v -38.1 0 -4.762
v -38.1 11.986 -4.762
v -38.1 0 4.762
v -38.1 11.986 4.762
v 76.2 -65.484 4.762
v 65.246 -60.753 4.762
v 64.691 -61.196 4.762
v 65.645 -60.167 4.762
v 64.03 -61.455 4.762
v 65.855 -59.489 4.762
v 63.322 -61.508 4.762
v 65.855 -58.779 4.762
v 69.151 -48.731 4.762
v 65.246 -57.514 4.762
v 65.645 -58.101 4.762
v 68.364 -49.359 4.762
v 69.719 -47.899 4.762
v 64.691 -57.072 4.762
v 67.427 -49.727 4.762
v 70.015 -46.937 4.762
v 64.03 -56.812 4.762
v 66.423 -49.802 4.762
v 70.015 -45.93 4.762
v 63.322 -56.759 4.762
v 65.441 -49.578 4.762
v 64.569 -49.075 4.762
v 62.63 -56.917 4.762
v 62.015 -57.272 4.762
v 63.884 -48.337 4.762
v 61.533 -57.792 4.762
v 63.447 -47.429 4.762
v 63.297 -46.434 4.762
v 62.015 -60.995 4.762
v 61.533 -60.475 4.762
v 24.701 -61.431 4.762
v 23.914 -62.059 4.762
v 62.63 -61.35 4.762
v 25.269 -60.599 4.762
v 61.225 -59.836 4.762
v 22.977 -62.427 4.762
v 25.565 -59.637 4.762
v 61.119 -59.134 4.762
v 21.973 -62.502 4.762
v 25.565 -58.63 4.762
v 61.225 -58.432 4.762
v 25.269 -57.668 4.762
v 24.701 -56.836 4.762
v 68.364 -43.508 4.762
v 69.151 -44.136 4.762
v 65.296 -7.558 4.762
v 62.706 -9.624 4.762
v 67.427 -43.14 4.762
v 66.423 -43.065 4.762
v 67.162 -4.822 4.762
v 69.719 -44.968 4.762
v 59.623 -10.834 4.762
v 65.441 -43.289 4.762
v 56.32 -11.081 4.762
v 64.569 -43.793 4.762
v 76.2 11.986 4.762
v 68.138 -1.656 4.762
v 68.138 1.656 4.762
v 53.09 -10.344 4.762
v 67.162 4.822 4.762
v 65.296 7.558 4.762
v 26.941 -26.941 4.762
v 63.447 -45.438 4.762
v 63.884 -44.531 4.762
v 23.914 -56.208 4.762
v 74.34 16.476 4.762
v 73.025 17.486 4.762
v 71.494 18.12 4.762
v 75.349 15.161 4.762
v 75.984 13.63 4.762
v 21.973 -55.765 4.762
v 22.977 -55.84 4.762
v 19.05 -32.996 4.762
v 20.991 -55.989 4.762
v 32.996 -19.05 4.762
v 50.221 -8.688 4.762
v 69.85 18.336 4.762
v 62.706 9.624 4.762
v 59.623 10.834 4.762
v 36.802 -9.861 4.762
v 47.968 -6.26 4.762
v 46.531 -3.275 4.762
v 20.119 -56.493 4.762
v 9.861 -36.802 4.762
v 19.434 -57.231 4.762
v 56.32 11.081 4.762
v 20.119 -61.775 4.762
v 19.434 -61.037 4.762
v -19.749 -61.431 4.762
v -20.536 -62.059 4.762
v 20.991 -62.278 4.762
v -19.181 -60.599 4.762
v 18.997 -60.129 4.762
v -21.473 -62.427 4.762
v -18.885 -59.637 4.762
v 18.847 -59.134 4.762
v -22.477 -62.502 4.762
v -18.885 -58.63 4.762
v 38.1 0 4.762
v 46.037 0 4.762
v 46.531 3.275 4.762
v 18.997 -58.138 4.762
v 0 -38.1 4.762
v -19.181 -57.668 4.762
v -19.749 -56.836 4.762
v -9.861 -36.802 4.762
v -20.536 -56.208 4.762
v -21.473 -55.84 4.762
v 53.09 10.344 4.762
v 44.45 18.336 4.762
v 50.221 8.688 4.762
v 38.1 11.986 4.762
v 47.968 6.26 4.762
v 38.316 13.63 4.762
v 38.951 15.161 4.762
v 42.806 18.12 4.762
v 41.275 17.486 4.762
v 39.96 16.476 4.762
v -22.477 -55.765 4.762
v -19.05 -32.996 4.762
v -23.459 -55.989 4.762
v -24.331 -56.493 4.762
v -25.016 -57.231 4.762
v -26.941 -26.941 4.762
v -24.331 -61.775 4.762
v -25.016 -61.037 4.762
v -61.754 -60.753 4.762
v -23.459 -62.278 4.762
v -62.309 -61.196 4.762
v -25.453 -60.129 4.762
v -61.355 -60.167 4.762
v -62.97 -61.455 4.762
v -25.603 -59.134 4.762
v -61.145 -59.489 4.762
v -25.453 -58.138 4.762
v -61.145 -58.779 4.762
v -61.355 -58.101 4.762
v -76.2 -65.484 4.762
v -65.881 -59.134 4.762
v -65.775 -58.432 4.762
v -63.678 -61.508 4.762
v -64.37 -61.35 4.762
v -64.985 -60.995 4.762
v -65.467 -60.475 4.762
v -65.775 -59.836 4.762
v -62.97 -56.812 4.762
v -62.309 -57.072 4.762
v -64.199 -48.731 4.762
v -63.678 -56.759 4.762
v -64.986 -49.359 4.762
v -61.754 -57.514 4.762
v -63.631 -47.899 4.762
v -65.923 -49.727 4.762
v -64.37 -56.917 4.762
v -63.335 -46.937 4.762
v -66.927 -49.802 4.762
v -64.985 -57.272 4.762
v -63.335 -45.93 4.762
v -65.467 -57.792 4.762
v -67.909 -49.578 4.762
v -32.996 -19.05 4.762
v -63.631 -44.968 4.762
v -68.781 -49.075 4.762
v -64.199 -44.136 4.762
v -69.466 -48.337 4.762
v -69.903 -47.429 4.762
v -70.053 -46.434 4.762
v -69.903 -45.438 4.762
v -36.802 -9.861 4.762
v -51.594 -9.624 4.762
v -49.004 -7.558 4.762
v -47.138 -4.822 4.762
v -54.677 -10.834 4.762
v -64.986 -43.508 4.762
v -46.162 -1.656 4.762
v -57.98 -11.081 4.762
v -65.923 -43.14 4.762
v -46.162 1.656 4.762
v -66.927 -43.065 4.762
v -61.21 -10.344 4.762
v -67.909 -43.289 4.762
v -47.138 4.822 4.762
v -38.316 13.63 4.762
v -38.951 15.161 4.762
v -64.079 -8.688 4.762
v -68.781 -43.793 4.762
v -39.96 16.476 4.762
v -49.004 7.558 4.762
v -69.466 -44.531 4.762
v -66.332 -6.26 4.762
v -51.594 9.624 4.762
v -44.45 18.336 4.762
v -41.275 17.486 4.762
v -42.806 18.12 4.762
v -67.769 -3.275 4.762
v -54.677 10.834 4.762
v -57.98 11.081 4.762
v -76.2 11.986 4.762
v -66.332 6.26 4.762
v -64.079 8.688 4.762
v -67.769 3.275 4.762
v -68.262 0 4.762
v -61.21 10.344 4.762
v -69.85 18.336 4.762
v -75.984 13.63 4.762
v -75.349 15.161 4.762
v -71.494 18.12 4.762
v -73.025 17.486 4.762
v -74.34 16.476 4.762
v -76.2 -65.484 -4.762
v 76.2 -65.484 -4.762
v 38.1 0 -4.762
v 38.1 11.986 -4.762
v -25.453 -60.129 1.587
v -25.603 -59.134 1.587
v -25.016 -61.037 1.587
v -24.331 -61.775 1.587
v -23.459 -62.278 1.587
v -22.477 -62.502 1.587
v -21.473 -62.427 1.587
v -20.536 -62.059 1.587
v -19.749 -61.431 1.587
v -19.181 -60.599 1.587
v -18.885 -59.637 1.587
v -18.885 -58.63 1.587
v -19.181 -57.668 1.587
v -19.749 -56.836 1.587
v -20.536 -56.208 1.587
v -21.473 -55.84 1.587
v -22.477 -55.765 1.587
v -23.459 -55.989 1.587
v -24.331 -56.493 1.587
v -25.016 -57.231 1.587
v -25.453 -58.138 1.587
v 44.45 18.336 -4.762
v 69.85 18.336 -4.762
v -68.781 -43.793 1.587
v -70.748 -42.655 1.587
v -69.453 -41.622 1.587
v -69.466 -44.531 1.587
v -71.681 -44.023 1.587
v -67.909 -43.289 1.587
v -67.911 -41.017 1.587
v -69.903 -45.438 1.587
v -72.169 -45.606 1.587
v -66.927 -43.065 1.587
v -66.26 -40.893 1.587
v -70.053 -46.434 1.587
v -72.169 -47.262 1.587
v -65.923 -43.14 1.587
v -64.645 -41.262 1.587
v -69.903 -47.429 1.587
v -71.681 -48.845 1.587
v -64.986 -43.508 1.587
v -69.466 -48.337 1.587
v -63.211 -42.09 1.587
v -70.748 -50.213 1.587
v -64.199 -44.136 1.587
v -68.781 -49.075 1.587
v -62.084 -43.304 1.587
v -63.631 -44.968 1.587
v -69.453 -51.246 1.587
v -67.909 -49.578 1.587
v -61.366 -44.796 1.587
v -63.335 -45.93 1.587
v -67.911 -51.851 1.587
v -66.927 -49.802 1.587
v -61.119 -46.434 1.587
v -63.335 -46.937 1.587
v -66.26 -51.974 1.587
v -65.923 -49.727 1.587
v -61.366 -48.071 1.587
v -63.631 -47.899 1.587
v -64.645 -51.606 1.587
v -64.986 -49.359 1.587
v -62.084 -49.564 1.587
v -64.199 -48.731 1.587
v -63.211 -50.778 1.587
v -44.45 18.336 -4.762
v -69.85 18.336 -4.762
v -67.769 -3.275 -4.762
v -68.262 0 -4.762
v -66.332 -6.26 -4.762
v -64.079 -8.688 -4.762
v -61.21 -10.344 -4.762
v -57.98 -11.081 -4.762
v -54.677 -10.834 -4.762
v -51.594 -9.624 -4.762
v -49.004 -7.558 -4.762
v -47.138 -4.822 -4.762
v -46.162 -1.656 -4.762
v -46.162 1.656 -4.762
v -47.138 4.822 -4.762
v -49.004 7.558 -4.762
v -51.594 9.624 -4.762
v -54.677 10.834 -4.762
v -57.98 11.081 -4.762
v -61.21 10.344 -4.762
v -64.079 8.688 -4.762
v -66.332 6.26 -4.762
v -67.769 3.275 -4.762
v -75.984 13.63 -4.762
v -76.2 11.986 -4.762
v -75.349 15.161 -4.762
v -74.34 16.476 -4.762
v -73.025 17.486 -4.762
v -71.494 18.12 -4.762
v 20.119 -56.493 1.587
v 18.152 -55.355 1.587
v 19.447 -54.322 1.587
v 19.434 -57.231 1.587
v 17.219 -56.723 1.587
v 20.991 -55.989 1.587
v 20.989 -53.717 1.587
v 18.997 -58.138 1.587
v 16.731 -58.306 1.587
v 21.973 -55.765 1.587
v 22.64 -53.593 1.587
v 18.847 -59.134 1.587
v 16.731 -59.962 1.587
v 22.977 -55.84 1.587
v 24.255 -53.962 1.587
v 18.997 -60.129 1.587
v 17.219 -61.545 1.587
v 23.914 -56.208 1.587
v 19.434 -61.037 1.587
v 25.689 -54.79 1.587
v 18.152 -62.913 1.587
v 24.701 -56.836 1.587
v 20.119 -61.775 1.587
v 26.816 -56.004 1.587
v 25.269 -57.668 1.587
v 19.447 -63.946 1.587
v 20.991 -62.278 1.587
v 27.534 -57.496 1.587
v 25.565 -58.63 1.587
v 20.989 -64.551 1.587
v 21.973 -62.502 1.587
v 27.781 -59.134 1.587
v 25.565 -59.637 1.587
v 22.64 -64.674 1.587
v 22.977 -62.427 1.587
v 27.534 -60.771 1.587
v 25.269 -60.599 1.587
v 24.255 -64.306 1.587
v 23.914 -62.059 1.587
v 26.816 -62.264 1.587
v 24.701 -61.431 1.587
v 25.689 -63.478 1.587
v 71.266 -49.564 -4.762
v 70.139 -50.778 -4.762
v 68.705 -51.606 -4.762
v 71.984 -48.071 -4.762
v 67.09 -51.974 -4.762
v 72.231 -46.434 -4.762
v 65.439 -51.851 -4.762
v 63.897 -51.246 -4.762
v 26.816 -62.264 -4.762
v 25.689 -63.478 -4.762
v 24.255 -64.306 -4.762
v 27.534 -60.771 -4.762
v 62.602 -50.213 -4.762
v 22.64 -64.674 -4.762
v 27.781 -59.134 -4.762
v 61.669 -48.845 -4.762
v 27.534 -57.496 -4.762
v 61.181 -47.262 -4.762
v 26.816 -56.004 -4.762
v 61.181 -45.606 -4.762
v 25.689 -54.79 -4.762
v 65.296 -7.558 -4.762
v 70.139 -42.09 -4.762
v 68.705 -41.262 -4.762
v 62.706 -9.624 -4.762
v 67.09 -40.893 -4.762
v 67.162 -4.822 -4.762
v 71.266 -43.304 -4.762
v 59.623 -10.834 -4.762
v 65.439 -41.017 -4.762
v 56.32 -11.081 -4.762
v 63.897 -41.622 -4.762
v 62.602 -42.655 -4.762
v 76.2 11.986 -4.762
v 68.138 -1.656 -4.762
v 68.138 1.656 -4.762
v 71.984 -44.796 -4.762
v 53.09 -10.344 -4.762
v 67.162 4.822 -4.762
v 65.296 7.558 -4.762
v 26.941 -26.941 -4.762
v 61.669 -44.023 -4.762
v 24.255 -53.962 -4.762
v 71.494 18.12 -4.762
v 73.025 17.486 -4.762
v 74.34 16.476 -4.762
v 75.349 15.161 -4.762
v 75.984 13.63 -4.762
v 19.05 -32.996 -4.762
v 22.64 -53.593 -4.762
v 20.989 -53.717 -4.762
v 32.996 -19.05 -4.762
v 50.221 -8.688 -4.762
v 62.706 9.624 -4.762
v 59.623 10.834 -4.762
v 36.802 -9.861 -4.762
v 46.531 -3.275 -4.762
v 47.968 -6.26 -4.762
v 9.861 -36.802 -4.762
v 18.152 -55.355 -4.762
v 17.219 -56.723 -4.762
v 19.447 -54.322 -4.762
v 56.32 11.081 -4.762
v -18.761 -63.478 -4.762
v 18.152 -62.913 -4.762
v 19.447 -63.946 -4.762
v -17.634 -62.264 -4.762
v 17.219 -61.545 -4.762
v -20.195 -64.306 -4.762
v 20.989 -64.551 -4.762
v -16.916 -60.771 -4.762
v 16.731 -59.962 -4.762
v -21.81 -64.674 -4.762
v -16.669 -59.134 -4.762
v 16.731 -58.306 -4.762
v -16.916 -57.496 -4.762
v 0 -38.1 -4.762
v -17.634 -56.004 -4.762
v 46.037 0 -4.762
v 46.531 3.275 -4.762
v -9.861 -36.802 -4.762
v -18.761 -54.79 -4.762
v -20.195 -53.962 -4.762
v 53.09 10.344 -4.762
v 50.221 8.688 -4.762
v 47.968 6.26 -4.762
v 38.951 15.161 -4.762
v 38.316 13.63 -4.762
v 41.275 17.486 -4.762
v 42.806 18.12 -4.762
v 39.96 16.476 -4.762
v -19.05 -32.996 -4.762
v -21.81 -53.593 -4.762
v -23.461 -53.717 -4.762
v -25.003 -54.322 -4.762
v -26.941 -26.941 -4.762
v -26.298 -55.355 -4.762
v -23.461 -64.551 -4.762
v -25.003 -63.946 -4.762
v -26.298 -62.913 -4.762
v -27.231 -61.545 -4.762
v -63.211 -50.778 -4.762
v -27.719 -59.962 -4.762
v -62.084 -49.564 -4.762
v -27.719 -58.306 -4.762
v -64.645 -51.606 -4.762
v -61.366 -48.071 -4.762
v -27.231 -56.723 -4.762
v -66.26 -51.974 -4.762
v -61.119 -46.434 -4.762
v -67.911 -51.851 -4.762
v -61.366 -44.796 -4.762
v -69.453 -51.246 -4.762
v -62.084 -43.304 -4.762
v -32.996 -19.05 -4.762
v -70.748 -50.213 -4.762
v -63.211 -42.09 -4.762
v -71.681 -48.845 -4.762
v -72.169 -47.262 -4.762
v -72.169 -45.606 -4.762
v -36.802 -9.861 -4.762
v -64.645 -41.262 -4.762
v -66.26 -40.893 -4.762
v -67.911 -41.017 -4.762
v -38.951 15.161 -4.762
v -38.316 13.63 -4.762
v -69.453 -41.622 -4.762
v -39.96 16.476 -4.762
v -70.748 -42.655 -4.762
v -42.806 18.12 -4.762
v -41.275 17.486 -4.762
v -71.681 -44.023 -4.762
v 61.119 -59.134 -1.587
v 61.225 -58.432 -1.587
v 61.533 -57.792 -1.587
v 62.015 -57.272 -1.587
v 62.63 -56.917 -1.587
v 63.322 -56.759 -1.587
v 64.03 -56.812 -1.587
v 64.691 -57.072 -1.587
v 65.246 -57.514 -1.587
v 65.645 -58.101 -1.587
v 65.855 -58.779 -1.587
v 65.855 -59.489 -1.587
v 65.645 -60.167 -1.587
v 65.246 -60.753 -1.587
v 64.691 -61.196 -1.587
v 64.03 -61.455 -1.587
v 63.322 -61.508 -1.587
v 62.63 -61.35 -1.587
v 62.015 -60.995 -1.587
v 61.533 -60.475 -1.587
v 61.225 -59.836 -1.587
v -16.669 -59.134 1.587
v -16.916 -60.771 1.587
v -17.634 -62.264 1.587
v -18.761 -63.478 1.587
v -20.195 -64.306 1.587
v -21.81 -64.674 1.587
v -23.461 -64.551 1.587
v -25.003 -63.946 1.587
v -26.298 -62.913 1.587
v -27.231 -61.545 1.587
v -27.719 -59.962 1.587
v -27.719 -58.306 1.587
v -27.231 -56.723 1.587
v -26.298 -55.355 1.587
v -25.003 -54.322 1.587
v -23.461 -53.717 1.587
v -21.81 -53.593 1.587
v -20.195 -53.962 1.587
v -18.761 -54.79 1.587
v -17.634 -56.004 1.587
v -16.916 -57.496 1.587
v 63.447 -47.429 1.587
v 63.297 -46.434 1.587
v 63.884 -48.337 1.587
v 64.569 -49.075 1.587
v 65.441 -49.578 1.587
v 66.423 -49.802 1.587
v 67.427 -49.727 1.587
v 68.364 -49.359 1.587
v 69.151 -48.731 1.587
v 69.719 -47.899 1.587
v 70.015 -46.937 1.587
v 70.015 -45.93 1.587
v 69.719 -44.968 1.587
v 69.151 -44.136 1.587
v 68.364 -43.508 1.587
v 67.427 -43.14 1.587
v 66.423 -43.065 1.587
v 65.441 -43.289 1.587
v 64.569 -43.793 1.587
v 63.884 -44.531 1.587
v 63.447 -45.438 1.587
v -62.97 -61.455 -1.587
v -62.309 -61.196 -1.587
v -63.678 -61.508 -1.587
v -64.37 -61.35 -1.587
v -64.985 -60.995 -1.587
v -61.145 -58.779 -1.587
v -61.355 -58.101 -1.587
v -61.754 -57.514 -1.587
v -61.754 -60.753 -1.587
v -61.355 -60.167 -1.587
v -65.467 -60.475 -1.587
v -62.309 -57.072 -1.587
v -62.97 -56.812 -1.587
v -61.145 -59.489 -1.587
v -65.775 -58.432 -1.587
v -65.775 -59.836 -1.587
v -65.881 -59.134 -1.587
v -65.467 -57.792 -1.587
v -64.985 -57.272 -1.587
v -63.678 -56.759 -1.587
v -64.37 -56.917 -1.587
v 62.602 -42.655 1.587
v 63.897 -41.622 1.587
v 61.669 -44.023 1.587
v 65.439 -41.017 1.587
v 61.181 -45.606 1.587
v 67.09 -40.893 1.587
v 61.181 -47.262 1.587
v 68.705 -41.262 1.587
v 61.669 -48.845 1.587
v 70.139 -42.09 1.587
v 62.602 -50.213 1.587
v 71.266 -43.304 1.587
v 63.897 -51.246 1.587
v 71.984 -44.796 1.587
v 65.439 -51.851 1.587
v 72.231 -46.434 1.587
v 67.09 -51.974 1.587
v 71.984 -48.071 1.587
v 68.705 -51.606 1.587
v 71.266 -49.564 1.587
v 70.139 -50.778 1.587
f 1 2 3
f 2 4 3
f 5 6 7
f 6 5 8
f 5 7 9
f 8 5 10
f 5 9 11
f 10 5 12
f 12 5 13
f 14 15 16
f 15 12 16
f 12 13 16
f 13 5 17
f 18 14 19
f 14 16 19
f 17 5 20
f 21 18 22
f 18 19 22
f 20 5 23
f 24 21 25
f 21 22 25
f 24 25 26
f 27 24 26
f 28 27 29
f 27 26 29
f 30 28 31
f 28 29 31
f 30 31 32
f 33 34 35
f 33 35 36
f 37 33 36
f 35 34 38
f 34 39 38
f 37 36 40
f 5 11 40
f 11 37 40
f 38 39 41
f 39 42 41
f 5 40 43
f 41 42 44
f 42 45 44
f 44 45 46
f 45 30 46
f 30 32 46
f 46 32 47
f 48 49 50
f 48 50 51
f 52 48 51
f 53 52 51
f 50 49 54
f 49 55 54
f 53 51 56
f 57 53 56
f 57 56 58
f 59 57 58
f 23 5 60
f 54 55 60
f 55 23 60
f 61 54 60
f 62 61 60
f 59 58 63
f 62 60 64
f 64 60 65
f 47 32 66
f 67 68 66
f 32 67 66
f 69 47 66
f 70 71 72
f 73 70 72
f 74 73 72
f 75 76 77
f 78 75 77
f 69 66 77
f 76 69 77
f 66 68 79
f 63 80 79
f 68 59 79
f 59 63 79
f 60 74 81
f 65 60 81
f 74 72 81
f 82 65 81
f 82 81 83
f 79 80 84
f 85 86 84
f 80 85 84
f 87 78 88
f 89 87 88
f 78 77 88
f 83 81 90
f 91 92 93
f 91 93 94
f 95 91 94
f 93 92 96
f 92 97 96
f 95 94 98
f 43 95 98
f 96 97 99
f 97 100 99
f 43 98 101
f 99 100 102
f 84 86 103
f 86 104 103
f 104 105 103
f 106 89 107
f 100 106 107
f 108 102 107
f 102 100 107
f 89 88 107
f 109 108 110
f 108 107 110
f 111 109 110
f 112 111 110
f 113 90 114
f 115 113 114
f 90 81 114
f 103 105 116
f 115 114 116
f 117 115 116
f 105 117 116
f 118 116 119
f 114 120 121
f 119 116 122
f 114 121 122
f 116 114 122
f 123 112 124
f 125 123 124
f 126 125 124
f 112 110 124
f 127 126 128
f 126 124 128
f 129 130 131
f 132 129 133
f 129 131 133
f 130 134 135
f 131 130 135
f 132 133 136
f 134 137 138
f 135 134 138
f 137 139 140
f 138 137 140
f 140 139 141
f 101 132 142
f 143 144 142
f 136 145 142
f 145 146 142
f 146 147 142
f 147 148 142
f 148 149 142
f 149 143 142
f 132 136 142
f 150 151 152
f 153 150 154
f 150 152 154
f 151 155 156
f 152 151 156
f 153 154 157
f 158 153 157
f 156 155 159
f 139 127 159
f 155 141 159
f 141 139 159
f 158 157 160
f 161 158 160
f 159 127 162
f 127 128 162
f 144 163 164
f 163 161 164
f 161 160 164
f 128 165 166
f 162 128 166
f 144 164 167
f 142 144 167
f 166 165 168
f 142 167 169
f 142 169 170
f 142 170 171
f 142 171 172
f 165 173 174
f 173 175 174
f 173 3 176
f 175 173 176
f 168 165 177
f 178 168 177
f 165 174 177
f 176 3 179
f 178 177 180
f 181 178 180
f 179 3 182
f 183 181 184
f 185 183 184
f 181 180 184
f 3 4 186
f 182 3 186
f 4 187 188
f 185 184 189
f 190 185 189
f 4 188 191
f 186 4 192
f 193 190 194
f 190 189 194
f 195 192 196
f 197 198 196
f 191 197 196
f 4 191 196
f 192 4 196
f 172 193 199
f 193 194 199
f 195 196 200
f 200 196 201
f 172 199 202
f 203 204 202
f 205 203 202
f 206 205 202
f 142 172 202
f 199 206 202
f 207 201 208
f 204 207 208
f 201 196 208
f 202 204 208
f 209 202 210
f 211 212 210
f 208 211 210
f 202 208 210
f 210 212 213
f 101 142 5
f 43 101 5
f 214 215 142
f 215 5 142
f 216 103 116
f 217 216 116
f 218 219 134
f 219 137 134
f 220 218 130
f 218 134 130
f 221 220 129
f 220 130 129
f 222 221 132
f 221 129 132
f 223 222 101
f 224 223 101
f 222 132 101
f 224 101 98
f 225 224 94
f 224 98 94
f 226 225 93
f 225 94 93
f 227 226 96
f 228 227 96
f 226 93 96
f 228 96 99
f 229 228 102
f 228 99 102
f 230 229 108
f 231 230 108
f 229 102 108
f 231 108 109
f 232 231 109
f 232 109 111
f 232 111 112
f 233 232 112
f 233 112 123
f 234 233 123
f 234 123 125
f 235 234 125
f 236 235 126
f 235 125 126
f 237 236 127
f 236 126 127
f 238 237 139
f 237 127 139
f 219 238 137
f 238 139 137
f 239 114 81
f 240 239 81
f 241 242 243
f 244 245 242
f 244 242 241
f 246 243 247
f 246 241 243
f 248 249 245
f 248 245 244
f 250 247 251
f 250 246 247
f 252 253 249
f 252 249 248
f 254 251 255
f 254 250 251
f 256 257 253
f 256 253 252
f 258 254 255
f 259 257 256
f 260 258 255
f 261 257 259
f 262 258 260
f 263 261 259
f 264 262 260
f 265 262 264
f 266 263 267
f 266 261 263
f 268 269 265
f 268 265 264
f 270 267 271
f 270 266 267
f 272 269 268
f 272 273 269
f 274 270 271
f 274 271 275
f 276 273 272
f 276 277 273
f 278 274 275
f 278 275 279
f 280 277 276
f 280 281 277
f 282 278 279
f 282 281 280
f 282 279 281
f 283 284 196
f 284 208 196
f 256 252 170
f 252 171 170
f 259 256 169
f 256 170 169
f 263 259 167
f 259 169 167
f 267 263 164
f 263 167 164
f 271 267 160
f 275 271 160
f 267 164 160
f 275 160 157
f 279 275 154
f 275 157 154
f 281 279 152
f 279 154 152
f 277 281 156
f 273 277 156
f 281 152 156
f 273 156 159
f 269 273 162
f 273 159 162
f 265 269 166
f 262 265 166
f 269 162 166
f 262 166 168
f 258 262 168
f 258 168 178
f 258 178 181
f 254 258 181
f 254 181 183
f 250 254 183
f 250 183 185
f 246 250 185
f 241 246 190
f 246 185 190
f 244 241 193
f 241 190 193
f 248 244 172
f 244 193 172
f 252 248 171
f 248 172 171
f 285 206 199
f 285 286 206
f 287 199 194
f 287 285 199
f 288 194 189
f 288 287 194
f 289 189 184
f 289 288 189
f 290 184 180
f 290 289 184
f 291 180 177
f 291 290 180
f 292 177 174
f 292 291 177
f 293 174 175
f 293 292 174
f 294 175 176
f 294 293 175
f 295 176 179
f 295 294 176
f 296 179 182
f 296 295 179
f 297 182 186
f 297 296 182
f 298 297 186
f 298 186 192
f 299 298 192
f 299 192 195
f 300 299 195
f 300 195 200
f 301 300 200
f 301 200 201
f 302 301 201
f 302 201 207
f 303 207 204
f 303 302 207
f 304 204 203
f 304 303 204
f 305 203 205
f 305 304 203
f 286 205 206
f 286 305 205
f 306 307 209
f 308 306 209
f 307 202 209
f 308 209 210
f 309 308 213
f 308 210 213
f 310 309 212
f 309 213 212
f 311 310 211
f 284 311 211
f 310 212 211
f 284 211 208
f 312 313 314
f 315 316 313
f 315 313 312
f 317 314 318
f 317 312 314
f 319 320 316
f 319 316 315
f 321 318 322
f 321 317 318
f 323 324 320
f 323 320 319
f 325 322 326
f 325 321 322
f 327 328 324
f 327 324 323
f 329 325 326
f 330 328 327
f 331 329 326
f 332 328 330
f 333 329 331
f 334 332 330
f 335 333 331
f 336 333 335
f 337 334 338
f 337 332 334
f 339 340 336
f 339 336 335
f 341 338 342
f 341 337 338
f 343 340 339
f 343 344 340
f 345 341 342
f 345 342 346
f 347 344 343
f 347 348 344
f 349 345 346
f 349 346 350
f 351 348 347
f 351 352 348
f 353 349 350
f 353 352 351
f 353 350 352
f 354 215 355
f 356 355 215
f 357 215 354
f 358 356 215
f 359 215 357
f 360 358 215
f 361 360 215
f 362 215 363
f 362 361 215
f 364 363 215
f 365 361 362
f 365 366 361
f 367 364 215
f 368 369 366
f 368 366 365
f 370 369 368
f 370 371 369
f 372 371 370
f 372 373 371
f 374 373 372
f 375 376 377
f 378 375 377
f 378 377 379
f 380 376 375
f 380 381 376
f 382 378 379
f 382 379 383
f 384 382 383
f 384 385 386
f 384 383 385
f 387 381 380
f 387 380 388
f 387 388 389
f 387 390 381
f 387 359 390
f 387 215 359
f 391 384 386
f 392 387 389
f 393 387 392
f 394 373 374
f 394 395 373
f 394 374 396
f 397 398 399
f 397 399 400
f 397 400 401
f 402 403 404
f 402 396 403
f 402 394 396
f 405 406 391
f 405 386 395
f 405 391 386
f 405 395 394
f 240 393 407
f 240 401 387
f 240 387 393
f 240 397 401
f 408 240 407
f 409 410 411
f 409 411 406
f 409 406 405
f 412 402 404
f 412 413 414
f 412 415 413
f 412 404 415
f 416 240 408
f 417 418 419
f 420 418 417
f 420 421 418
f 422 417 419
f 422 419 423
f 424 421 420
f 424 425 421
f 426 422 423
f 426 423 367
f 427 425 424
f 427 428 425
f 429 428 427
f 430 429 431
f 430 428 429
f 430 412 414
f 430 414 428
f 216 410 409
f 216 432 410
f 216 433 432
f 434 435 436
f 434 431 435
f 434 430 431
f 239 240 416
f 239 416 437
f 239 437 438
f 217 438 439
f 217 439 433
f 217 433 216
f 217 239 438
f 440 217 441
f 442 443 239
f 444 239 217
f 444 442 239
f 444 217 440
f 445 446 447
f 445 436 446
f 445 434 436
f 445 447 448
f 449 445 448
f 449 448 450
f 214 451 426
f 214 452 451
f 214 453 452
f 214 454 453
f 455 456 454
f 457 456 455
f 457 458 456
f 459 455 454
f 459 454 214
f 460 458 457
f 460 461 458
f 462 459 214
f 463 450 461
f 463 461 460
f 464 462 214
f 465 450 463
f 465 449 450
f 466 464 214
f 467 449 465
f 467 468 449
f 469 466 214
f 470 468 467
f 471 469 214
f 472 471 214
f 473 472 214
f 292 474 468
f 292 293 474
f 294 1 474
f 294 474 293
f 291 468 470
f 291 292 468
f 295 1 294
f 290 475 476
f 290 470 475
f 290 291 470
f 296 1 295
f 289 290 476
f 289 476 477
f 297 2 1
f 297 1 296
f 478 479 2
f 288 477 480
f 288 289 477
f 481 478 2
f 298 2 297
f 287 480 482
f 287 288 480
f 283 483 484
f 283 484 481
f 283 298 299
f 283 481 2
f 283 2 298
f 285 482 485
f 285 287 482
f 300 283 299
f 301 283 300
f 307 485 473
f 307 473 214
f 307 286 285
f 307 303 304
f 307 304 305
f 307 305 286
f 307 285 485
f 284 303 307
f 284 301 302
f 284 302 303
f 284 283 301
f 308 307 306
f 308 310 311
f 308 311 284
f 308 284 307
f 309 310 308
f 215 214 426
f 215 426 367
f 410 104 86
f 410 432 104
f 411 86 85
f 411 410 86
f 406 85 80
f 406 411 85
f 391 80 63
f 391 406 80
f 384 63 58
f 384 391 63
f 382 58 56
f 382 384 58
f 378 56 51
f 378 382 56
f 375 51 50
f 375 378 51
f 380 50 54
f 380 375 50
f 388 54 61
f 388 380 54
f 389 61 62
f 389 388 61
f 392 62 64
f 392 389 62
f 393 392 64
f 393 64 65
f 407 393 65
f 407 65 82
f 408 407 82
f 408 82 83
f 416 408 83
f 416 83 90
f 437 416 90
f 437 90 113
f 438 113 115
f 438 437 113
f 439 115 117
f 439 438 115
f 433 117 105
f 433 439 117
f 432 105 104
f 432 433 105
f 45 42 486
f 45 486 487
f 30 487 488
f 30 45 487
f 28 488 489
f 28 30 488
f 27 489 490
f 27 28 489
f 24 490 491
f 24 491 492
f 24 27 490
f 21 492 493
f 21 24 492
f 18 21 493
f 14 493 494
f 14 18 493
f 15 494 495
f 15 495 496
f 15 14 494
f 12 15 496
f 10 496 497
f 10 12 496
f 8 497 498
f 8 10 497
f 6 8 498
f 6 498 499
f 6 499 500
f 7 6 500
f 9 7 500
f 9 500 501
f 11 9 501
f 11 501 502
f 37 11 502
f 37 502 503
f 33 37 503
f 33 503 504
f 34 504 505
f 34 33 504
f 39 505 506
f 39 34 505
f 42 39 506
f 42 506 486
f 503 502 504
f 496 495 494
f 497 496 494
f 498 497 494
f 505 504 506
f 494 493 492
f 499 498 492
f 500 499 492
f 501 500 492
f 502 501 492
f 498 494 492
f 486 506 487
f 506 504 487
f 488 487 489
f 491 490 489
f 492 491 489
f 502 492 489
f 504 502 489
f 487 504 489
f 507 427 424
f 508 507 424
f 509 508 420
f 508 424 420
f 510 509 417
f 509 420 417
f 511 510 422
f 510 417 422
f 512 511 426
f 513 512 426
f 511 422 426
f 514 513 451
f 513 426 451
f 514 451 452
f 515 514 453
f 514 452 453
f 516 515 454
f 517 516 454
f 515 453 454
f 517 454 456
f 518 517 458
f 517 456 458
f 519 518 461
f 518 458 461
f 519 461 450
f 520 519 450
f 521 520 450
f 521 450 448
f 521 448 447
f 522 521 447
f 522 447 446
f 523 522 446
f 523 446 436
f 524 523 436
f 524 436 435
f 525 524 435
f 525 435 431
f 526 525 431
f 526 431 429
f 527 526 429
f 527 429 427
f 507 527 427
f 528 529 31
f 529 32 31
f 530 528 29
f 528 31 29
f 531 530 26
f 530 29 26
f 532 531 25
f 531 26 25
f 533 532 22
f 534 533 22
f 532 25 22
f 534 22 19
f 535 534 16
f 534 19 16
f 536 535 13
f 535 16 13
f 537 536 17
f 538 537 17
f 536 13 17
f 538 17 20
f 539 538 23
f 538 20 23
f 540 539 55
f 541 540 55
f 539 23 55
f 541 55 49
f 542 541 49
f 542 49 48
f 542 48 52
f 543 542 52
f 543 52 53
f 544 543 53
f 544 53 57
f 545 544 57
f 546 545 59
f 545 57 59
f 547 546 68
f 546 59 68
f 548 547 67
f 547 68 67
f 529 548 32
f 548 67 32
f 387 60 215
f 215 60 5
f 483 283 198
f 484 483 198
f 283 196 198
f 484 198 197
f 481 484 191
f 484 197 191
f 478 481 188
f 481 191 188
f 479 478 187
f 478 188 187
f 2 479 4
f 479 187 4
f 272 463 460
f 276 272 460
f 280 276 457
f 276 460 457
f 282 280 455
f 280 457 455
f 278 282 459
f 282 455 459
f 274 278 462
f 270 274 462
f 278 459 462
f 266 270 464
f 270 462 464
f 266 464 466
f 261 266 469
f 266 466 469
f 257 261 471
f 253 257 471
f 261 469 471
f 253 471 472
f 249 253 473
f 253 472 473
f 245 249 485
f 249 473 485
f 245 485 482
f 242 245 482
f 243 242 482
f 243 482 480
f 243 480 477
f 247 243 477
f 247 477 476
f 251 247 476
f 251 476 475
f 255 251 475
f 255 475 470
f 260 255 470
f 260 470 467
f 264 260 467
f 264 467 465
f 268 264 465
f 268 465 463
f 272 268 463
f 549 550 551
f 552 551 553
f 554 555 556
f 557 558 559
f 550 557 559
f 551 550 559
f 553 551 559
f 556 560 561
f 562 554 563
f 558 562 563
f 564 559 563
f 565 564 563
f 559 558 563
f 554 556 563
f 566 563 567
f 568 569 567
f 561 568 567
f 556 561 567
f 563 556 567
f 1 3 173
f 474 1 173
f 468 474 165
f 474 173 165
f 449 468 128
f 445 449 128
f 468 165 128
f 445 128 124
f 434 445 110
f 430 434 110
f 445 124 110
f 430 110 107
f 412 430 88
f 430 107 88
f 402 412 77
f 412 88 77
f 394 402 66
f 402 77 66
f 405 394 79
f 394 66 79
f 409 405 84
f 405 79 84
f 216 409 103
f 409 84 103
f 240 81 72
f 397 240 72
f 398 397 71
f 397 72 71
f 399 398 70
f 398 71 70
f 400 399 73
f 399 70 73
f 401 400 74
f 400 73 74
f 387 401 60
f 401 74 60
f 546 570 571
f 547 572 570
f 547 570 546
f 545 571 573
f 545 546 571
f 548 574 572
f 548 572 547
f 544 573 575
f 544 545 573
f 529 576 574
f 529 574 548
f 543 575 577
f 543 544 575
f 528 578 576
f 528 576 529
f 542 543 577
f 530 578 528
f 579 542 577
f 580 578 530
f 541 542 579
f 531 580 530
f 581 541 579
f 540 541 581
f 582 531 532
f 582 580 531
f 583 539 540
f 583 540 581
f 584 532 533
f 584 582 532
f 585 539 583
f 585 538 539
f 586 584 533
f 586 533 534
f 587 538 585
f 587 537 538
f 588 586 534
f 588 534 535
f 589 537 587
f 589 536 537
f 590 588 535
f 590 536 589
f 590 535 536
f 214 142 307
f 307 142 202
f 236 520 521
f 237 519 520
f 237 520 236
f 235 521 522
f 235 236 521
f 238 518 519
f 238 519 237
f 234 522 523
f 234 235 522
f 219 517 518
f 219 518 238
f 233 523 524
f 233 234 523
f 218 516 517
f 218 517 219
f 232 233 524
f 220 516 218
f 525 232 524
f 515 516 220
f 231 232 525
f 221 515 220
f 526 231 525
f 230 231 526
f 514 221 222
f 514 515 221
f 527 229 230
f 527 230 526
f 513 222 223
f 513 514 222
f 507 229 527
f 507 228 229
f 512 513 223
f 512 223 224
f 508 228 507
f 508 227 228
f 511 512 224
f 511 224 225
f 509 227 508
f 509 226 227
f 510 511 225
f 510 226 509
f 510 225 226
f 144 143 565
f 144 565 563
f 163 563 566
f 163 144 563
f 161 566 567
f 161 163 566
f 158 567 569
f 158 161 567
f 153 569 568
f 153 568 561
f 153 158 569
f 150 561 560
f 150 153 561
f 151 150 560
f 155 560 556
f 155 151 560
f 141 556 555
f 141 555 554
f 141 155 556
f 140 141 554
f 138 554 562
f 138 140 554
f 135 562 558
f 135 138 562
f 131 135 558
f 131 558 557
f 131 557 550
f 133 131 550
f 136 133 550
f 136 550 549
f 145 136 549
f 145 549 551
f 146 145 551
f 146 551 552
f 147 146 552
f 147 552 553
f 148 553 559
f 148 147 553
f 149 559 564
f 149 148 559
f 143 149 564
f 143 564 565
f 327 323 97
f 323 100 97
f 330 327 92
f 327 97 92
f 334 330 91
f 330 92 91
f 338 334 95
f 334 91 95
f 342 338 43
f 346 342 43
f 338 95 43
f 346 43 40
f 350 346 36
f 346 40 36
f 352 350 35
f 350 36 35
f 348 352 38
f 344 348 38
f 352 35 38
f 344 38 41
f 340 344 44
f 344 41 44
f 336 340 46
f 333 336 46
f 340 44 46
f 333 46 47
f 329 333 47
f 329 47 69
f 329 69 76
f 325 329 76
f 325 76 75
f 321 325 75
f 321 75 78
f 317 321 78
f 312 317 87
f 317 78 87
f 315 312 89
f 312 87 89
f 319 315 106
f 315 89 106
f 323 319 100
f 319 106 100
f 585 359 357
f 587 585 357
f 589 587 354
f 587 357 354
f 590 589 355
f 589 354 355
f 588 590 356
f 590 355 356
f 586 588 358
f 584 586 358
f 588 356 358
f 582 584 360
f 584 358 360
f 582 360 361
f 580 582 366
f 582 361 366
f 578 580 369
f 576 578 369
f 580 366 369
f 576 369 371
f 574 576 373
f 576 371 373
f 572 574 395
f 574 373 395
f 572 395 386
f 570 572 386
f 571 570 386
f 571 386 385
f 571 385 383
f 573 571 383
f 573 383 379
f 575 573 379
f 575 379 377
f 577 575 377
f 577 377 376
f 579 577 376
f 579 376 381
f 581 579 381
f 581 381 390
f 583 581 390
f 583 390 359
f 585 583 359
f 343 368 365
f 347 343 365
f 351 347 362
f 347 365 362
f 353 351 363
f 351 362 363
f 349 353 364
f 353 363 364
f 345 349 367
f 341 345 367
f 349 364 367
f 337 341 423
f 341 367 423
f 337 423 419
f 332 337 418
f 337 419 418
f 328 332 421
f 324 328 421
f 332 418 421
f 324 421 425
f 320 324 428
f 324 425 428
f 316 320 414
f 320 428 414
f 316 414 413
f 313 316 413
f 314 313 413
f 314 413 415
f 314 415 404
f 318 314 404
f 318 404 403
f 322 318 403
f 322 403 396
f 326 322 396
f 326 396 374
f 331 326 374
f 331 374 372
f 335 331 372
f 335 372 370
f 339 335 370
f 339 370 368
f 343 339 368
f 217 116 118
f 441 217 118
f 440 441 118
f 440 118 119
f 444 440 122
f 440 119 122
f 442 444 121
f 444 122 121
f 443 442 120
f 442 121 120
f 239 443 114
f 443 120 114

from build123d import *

# Parameters (mm, degrees)
SKETCH1_R                                   = 11.1125
BASE_DEPTH                                  = 4.7625
F_1_4_CAP_SCREW_CARRIAGE_MOUNTS_D           = 6.7564
F_1_4_CAP_SCREW_CARRIAGE_MOUNTS_CBORE_D     = 11.1125
F_1_4_CAP_SCREW_CARRIAGE_MOUNTS_CBORE_DEPTH = 6.35
SKETCH9_R                                   = 2.38125
ALIGNMENT_PIN_HOLES_DEPTH                   = 6.35


with BuildPart() as part:
    # Sketch1 → Base (new, symmetric)
    with BuildSketch(Plane.XY):
        with BuildLine():
            Line((76.2, 11.98626), (76.2, -65.48374))
            Line((76.2, -65.48374), (-76.2, -65.48374))
            Line((-76.2, -65.48374), (-76.2, 11.98626))
            ThreePointArc((-76.2, 11.98626), (-74.340128061, 16.476388061), (-69.85, 18.33626))
            Line((-69.85, 18.33626), (-44.45, 18.33626))
            ThreePointArc((-44.45, 18.33626), (-39.959871939, 16.476388061), (-38.1, 11.98626))
            Line((-38.1, 11.98626), (-38.1, 0))
            ThreePointArc((-38.1, 0), (0, -38.1), (38.1, 0))
            Line((38.1, 0), (38.1, 11.98626))
            ThreePointArc((38.1, 11.98626), (39.959871939, 16.476388061), (44.45, 18.33626))
            Line((44.45, 18.33626), (69.85, 18.33626))
            ThreePointArc((69.85, 18.33626), (74.340128061, 16.476388061), (76.2, 11.98626))
        make_face()
        with Locations((-57.15, 0)):
            Circle(SKETCH1_R, mode=Mode.SUBTRACT)
        with Locations((57.15, 0)):
            Circle(SKETCH1_R, mode=Mode.SUBTRACT)
    extrude(amount=BASE_DEPTH, both=True)

    # 1/4 Cap screw carriage mounts (through all)
    with Locations(Plane(origin=(-61.987391614, 5.409091563, -4.7625), x_dir=(1, 0, 0), z_dir=(0, 0, -1))):
        with Locations((-4.687608386, 51.842831563), (39.762391614, 64.542831563), (128.662391614, 51.842831563), (84.212391614, 64.542831563)):
            CounterBoreHole(F_1_4_CAP_SCREW_CARRIAGE_MOUNTS_D / 2, F_1_4_CAP_SCREW_CARRIAGE_MOUNTS_CBORE_D / 2, F_1_4_CAP_SCREW_CARRIAGE_MOUNTS_CBORE_DEPTH)

    # Sketch9 → Alignment_pin_holes (cut)
    with BuildSketch(Plane(origin=(0, 0, 4.7625), x_dir=(-1, 0, 0), z_dir=(0, 0, -1))):
        with Locations((63.5, -59.13374)):
            Circle(SKETCH9_R)
        with Locations((-63.5, -59.13374)):
            Circle(SKETCH9_R)
    extrude(amount=ALIGNMENT_PIN_HOLES_DEPTH, mode=Mode.SUBTRACT)


solid = part.part
